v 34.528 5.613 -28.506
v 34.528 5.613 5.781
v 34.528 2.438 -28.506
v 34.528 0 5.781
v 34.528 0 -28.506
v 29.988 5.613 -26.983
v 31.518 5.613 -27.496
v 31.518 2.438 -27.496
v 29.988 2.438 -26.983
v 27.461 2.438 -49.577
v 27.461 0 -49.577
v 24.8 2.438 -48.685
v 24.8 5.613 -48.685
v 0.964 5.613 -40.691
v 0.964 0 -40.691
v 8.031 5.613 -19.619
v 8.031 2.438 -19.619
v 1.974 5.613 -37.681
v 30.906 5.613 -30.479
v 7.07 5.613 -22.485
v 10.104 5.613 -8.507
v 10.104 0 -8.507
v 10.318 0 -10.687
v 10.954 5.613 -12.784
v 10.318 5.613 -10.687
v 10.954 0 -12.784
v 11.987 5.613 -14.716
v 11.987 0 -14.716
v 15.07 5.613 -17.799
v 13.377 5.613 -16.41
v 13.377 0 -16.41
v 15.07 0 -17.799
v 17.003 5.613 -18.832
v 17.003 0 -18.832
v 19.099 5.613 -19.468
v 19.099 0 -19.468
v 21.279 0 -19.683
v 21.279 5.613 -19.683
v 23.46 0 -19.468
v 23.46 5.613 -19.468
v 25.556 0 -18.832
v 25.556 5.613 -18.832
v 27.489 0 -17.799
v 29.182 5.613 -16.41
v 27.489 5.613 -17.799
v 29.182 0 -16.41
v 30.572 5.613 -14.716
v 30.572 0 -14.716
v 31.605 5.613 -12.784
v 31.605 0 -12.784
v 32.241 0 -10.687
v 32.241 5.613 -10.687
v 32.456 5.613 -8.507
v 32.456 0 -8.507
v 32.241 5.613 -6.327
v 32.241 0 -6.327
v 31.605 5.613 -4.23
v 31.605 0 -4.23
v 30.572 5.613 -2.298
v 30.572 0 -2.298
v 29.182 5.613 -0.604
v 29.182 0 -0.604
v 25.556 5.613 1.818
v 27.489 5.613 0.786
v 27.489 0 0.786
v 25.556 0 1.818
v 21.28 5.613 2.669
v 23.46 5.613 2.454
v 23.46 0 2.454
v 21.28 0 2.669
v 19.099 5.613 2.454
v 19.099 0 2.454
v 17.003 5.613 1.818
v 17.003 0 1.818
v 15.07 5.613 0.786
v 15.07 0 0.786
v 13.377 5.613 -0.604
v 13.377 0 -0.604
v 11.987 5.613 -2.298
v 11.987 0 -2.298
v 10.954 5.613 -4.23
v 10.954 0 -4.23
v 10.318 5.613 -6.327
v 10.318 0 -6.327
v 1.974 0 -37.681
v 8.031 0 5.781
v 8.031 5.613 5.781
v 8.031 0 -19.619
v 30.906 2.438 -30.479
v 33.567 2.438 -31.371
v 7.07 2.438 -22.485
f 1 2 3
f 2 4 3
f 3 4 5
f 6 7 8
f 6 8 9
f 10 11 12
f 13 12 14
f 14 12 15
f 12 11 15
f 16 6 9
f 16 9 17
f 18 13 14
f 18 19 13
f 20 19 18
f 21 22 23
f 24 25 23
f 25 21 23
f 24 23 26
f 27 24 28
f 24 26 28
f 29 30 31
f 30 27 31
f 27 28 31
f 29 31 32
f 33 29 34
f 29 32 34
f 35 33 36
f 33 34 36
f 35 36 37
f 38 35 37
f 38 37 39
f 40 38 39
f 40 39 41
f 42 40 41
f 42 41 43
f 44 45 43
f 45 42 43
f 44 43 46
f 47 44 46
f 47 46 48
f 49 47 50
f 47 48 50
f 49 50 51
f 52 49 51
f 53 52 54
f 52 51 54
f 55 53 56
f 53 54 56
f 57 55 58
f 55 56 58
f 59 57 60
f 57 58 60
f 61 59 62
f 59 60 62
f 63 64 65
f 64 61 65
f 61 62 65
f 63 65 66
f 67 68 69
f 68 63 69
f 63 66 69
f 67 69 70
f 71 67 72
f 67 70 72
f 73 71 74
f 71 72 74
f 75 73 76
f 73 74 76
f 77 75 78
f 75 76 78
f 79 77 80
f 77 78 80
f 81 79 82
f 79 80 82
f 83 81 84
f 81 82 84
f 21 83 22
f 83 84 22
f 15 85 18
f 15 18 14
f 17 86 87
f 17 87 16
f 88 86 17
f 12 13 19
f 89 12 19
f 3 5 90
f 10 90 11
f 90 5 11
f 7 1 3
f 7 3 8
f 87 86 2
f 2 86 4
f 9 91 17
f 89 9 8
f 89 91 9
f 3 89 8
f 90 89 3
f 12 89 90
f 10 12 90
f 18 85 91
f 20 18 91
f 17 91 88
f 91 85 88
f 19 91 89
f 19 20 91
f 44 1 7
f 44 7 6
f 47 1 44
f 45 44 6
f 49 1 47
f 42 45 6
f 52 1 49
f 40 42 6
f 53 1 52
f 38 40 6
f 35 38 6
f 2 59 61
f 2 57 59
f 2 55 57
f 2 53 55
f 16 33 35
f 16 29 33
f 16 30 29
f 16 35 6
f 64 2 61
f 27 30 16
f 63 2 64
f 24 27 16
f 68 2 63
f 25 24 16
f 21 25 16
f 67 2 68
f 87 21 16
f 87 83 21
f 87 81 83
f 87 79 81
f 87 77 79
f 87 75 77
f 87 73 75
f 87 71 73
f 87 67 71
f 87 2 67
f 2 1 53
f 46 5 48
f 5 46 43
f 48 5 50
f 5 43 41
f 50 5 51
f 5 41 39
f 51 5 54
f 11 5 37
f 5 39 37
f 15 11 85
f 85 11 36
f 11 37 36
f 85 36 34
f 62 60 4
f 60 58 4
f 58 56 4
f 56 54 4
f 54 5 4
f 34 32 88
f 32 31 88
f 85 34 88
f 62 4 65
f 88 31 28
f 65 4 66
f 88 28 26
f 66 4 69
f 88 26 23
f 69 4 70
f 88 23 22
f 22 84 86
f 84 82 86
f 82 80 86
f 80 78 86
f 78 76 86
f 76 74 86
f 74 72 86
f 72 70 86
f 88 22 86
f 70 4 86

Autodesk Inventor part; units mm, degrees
ref_plane "YZ Plane" through (0, 0, 0) normal (1, 0, 0) x (0, 1, 0)
ref_plane "XZ Plane" through (0, 0, 0) normal (0, 1, 0) x (-1, 0, 0)
ref_plane "XY Plane" through (0, 0, 0) normal (0, 0, 1) x (1, 0, 0)
sketch "Sketch1" plane through (0, 0, 0) normal (0, 1, 0) x (-1, 0, 0)
  line L0 (-8.0312, 5.7806) -> (-34.5277, 5.7806)
  line L1 (-34.5277, 5.7806) -> (-34.5277, -28.5056)
  line L2 (18.6455, 5.0782) -> (18.6456, 5.0782)
  line L3 (-1.974, -37.6808) -> (-8.0312, -19.6194)
  line L4 (-34.5277, -28.5056) -> (-27.4611, -49.5771)
  line L5 (-1.974, -37.6808) -> (-0.9645, -40.691)
  line L6 (-27.4611, -49.5771) -> (-0.9645, -40.691)
  circle A0 centre (-21.2795, -8.5069) radius 11.176
  line L7 (-8.0312, 5.7806) -> (-8.0312, -19.6194)
  line L8 (-8.0312, -19.6194) -> (-0.9645, -40.691)
  line L9 (-0.9645, -40.691) -> (-27.4611, -49.5771)
  line L10 (-27.4611, -49.5771) -> (-34.5277, -28.5056)
  line L11 (-34.5277, -28.5056) -> (-34.5277, 5.7806)
  line L12 (-34.5277, 5.7806) -> (-8.0312, 5.7806)
  point P0 (0, 0)
  dimension "d1" = 22.225
  dimension "d2" = 27.9469
  dimension "d3" = 26.4965
  dimension "d4" = 22.352
  dimension "d20" = 14.2875
  dimension "d23" = 25.4
extrude "Extrusion1" add sketch "Sketch1" along normal blind 5.6134
sketch "Sketch2" plane through (0, 5.6134, 0) normal (0, 1, 0) x (1, 0, 0)
  line L0 (34.5277, 28.5056) -> (8.0312, 19.6194)
  line L1 (8.0312, 19.6194) -> (7.0701, 22.4851)
  line L2 (7.0701, 22.4851) -> (33.5666, 31.3713)
  line L3 (31.5176, 27.4961) -> (29.9884, 26.9832)
  line L4 (34.5277, 28.5056) -> (27.4611, 49.5771) projected
  point P0 (0, 0)
  point P1 (0, 0)
  dimension "d11" = 3.0226
extrude "Extrusion2" cut sketch "Sketch2" against normal blind 3.175
sketch "Sketch3" plane through (0, 5.6134, 0) normal (0, 1, 0) x (1, 0, 0)
  line L0 (7.0701, 22.4852) -> (33.5666, 31.3713) projected
  line L1 (33.5666, 31.3713) -> (27.4611, 49.5771) projected
  line L2 (27.4611, 49.5771) -> (0.9645, 40.691) projected
  line L3 (24.8, 48.6846) -> (30.9056, 30.4789)
  point P0 (0, 0)
  dimension "d17" = 2.8067
extrude "Extrusion3" cut sketch "Sketch3" against normal blind 3.175
properties part number "Lidar Sensor Case Piece 2"
